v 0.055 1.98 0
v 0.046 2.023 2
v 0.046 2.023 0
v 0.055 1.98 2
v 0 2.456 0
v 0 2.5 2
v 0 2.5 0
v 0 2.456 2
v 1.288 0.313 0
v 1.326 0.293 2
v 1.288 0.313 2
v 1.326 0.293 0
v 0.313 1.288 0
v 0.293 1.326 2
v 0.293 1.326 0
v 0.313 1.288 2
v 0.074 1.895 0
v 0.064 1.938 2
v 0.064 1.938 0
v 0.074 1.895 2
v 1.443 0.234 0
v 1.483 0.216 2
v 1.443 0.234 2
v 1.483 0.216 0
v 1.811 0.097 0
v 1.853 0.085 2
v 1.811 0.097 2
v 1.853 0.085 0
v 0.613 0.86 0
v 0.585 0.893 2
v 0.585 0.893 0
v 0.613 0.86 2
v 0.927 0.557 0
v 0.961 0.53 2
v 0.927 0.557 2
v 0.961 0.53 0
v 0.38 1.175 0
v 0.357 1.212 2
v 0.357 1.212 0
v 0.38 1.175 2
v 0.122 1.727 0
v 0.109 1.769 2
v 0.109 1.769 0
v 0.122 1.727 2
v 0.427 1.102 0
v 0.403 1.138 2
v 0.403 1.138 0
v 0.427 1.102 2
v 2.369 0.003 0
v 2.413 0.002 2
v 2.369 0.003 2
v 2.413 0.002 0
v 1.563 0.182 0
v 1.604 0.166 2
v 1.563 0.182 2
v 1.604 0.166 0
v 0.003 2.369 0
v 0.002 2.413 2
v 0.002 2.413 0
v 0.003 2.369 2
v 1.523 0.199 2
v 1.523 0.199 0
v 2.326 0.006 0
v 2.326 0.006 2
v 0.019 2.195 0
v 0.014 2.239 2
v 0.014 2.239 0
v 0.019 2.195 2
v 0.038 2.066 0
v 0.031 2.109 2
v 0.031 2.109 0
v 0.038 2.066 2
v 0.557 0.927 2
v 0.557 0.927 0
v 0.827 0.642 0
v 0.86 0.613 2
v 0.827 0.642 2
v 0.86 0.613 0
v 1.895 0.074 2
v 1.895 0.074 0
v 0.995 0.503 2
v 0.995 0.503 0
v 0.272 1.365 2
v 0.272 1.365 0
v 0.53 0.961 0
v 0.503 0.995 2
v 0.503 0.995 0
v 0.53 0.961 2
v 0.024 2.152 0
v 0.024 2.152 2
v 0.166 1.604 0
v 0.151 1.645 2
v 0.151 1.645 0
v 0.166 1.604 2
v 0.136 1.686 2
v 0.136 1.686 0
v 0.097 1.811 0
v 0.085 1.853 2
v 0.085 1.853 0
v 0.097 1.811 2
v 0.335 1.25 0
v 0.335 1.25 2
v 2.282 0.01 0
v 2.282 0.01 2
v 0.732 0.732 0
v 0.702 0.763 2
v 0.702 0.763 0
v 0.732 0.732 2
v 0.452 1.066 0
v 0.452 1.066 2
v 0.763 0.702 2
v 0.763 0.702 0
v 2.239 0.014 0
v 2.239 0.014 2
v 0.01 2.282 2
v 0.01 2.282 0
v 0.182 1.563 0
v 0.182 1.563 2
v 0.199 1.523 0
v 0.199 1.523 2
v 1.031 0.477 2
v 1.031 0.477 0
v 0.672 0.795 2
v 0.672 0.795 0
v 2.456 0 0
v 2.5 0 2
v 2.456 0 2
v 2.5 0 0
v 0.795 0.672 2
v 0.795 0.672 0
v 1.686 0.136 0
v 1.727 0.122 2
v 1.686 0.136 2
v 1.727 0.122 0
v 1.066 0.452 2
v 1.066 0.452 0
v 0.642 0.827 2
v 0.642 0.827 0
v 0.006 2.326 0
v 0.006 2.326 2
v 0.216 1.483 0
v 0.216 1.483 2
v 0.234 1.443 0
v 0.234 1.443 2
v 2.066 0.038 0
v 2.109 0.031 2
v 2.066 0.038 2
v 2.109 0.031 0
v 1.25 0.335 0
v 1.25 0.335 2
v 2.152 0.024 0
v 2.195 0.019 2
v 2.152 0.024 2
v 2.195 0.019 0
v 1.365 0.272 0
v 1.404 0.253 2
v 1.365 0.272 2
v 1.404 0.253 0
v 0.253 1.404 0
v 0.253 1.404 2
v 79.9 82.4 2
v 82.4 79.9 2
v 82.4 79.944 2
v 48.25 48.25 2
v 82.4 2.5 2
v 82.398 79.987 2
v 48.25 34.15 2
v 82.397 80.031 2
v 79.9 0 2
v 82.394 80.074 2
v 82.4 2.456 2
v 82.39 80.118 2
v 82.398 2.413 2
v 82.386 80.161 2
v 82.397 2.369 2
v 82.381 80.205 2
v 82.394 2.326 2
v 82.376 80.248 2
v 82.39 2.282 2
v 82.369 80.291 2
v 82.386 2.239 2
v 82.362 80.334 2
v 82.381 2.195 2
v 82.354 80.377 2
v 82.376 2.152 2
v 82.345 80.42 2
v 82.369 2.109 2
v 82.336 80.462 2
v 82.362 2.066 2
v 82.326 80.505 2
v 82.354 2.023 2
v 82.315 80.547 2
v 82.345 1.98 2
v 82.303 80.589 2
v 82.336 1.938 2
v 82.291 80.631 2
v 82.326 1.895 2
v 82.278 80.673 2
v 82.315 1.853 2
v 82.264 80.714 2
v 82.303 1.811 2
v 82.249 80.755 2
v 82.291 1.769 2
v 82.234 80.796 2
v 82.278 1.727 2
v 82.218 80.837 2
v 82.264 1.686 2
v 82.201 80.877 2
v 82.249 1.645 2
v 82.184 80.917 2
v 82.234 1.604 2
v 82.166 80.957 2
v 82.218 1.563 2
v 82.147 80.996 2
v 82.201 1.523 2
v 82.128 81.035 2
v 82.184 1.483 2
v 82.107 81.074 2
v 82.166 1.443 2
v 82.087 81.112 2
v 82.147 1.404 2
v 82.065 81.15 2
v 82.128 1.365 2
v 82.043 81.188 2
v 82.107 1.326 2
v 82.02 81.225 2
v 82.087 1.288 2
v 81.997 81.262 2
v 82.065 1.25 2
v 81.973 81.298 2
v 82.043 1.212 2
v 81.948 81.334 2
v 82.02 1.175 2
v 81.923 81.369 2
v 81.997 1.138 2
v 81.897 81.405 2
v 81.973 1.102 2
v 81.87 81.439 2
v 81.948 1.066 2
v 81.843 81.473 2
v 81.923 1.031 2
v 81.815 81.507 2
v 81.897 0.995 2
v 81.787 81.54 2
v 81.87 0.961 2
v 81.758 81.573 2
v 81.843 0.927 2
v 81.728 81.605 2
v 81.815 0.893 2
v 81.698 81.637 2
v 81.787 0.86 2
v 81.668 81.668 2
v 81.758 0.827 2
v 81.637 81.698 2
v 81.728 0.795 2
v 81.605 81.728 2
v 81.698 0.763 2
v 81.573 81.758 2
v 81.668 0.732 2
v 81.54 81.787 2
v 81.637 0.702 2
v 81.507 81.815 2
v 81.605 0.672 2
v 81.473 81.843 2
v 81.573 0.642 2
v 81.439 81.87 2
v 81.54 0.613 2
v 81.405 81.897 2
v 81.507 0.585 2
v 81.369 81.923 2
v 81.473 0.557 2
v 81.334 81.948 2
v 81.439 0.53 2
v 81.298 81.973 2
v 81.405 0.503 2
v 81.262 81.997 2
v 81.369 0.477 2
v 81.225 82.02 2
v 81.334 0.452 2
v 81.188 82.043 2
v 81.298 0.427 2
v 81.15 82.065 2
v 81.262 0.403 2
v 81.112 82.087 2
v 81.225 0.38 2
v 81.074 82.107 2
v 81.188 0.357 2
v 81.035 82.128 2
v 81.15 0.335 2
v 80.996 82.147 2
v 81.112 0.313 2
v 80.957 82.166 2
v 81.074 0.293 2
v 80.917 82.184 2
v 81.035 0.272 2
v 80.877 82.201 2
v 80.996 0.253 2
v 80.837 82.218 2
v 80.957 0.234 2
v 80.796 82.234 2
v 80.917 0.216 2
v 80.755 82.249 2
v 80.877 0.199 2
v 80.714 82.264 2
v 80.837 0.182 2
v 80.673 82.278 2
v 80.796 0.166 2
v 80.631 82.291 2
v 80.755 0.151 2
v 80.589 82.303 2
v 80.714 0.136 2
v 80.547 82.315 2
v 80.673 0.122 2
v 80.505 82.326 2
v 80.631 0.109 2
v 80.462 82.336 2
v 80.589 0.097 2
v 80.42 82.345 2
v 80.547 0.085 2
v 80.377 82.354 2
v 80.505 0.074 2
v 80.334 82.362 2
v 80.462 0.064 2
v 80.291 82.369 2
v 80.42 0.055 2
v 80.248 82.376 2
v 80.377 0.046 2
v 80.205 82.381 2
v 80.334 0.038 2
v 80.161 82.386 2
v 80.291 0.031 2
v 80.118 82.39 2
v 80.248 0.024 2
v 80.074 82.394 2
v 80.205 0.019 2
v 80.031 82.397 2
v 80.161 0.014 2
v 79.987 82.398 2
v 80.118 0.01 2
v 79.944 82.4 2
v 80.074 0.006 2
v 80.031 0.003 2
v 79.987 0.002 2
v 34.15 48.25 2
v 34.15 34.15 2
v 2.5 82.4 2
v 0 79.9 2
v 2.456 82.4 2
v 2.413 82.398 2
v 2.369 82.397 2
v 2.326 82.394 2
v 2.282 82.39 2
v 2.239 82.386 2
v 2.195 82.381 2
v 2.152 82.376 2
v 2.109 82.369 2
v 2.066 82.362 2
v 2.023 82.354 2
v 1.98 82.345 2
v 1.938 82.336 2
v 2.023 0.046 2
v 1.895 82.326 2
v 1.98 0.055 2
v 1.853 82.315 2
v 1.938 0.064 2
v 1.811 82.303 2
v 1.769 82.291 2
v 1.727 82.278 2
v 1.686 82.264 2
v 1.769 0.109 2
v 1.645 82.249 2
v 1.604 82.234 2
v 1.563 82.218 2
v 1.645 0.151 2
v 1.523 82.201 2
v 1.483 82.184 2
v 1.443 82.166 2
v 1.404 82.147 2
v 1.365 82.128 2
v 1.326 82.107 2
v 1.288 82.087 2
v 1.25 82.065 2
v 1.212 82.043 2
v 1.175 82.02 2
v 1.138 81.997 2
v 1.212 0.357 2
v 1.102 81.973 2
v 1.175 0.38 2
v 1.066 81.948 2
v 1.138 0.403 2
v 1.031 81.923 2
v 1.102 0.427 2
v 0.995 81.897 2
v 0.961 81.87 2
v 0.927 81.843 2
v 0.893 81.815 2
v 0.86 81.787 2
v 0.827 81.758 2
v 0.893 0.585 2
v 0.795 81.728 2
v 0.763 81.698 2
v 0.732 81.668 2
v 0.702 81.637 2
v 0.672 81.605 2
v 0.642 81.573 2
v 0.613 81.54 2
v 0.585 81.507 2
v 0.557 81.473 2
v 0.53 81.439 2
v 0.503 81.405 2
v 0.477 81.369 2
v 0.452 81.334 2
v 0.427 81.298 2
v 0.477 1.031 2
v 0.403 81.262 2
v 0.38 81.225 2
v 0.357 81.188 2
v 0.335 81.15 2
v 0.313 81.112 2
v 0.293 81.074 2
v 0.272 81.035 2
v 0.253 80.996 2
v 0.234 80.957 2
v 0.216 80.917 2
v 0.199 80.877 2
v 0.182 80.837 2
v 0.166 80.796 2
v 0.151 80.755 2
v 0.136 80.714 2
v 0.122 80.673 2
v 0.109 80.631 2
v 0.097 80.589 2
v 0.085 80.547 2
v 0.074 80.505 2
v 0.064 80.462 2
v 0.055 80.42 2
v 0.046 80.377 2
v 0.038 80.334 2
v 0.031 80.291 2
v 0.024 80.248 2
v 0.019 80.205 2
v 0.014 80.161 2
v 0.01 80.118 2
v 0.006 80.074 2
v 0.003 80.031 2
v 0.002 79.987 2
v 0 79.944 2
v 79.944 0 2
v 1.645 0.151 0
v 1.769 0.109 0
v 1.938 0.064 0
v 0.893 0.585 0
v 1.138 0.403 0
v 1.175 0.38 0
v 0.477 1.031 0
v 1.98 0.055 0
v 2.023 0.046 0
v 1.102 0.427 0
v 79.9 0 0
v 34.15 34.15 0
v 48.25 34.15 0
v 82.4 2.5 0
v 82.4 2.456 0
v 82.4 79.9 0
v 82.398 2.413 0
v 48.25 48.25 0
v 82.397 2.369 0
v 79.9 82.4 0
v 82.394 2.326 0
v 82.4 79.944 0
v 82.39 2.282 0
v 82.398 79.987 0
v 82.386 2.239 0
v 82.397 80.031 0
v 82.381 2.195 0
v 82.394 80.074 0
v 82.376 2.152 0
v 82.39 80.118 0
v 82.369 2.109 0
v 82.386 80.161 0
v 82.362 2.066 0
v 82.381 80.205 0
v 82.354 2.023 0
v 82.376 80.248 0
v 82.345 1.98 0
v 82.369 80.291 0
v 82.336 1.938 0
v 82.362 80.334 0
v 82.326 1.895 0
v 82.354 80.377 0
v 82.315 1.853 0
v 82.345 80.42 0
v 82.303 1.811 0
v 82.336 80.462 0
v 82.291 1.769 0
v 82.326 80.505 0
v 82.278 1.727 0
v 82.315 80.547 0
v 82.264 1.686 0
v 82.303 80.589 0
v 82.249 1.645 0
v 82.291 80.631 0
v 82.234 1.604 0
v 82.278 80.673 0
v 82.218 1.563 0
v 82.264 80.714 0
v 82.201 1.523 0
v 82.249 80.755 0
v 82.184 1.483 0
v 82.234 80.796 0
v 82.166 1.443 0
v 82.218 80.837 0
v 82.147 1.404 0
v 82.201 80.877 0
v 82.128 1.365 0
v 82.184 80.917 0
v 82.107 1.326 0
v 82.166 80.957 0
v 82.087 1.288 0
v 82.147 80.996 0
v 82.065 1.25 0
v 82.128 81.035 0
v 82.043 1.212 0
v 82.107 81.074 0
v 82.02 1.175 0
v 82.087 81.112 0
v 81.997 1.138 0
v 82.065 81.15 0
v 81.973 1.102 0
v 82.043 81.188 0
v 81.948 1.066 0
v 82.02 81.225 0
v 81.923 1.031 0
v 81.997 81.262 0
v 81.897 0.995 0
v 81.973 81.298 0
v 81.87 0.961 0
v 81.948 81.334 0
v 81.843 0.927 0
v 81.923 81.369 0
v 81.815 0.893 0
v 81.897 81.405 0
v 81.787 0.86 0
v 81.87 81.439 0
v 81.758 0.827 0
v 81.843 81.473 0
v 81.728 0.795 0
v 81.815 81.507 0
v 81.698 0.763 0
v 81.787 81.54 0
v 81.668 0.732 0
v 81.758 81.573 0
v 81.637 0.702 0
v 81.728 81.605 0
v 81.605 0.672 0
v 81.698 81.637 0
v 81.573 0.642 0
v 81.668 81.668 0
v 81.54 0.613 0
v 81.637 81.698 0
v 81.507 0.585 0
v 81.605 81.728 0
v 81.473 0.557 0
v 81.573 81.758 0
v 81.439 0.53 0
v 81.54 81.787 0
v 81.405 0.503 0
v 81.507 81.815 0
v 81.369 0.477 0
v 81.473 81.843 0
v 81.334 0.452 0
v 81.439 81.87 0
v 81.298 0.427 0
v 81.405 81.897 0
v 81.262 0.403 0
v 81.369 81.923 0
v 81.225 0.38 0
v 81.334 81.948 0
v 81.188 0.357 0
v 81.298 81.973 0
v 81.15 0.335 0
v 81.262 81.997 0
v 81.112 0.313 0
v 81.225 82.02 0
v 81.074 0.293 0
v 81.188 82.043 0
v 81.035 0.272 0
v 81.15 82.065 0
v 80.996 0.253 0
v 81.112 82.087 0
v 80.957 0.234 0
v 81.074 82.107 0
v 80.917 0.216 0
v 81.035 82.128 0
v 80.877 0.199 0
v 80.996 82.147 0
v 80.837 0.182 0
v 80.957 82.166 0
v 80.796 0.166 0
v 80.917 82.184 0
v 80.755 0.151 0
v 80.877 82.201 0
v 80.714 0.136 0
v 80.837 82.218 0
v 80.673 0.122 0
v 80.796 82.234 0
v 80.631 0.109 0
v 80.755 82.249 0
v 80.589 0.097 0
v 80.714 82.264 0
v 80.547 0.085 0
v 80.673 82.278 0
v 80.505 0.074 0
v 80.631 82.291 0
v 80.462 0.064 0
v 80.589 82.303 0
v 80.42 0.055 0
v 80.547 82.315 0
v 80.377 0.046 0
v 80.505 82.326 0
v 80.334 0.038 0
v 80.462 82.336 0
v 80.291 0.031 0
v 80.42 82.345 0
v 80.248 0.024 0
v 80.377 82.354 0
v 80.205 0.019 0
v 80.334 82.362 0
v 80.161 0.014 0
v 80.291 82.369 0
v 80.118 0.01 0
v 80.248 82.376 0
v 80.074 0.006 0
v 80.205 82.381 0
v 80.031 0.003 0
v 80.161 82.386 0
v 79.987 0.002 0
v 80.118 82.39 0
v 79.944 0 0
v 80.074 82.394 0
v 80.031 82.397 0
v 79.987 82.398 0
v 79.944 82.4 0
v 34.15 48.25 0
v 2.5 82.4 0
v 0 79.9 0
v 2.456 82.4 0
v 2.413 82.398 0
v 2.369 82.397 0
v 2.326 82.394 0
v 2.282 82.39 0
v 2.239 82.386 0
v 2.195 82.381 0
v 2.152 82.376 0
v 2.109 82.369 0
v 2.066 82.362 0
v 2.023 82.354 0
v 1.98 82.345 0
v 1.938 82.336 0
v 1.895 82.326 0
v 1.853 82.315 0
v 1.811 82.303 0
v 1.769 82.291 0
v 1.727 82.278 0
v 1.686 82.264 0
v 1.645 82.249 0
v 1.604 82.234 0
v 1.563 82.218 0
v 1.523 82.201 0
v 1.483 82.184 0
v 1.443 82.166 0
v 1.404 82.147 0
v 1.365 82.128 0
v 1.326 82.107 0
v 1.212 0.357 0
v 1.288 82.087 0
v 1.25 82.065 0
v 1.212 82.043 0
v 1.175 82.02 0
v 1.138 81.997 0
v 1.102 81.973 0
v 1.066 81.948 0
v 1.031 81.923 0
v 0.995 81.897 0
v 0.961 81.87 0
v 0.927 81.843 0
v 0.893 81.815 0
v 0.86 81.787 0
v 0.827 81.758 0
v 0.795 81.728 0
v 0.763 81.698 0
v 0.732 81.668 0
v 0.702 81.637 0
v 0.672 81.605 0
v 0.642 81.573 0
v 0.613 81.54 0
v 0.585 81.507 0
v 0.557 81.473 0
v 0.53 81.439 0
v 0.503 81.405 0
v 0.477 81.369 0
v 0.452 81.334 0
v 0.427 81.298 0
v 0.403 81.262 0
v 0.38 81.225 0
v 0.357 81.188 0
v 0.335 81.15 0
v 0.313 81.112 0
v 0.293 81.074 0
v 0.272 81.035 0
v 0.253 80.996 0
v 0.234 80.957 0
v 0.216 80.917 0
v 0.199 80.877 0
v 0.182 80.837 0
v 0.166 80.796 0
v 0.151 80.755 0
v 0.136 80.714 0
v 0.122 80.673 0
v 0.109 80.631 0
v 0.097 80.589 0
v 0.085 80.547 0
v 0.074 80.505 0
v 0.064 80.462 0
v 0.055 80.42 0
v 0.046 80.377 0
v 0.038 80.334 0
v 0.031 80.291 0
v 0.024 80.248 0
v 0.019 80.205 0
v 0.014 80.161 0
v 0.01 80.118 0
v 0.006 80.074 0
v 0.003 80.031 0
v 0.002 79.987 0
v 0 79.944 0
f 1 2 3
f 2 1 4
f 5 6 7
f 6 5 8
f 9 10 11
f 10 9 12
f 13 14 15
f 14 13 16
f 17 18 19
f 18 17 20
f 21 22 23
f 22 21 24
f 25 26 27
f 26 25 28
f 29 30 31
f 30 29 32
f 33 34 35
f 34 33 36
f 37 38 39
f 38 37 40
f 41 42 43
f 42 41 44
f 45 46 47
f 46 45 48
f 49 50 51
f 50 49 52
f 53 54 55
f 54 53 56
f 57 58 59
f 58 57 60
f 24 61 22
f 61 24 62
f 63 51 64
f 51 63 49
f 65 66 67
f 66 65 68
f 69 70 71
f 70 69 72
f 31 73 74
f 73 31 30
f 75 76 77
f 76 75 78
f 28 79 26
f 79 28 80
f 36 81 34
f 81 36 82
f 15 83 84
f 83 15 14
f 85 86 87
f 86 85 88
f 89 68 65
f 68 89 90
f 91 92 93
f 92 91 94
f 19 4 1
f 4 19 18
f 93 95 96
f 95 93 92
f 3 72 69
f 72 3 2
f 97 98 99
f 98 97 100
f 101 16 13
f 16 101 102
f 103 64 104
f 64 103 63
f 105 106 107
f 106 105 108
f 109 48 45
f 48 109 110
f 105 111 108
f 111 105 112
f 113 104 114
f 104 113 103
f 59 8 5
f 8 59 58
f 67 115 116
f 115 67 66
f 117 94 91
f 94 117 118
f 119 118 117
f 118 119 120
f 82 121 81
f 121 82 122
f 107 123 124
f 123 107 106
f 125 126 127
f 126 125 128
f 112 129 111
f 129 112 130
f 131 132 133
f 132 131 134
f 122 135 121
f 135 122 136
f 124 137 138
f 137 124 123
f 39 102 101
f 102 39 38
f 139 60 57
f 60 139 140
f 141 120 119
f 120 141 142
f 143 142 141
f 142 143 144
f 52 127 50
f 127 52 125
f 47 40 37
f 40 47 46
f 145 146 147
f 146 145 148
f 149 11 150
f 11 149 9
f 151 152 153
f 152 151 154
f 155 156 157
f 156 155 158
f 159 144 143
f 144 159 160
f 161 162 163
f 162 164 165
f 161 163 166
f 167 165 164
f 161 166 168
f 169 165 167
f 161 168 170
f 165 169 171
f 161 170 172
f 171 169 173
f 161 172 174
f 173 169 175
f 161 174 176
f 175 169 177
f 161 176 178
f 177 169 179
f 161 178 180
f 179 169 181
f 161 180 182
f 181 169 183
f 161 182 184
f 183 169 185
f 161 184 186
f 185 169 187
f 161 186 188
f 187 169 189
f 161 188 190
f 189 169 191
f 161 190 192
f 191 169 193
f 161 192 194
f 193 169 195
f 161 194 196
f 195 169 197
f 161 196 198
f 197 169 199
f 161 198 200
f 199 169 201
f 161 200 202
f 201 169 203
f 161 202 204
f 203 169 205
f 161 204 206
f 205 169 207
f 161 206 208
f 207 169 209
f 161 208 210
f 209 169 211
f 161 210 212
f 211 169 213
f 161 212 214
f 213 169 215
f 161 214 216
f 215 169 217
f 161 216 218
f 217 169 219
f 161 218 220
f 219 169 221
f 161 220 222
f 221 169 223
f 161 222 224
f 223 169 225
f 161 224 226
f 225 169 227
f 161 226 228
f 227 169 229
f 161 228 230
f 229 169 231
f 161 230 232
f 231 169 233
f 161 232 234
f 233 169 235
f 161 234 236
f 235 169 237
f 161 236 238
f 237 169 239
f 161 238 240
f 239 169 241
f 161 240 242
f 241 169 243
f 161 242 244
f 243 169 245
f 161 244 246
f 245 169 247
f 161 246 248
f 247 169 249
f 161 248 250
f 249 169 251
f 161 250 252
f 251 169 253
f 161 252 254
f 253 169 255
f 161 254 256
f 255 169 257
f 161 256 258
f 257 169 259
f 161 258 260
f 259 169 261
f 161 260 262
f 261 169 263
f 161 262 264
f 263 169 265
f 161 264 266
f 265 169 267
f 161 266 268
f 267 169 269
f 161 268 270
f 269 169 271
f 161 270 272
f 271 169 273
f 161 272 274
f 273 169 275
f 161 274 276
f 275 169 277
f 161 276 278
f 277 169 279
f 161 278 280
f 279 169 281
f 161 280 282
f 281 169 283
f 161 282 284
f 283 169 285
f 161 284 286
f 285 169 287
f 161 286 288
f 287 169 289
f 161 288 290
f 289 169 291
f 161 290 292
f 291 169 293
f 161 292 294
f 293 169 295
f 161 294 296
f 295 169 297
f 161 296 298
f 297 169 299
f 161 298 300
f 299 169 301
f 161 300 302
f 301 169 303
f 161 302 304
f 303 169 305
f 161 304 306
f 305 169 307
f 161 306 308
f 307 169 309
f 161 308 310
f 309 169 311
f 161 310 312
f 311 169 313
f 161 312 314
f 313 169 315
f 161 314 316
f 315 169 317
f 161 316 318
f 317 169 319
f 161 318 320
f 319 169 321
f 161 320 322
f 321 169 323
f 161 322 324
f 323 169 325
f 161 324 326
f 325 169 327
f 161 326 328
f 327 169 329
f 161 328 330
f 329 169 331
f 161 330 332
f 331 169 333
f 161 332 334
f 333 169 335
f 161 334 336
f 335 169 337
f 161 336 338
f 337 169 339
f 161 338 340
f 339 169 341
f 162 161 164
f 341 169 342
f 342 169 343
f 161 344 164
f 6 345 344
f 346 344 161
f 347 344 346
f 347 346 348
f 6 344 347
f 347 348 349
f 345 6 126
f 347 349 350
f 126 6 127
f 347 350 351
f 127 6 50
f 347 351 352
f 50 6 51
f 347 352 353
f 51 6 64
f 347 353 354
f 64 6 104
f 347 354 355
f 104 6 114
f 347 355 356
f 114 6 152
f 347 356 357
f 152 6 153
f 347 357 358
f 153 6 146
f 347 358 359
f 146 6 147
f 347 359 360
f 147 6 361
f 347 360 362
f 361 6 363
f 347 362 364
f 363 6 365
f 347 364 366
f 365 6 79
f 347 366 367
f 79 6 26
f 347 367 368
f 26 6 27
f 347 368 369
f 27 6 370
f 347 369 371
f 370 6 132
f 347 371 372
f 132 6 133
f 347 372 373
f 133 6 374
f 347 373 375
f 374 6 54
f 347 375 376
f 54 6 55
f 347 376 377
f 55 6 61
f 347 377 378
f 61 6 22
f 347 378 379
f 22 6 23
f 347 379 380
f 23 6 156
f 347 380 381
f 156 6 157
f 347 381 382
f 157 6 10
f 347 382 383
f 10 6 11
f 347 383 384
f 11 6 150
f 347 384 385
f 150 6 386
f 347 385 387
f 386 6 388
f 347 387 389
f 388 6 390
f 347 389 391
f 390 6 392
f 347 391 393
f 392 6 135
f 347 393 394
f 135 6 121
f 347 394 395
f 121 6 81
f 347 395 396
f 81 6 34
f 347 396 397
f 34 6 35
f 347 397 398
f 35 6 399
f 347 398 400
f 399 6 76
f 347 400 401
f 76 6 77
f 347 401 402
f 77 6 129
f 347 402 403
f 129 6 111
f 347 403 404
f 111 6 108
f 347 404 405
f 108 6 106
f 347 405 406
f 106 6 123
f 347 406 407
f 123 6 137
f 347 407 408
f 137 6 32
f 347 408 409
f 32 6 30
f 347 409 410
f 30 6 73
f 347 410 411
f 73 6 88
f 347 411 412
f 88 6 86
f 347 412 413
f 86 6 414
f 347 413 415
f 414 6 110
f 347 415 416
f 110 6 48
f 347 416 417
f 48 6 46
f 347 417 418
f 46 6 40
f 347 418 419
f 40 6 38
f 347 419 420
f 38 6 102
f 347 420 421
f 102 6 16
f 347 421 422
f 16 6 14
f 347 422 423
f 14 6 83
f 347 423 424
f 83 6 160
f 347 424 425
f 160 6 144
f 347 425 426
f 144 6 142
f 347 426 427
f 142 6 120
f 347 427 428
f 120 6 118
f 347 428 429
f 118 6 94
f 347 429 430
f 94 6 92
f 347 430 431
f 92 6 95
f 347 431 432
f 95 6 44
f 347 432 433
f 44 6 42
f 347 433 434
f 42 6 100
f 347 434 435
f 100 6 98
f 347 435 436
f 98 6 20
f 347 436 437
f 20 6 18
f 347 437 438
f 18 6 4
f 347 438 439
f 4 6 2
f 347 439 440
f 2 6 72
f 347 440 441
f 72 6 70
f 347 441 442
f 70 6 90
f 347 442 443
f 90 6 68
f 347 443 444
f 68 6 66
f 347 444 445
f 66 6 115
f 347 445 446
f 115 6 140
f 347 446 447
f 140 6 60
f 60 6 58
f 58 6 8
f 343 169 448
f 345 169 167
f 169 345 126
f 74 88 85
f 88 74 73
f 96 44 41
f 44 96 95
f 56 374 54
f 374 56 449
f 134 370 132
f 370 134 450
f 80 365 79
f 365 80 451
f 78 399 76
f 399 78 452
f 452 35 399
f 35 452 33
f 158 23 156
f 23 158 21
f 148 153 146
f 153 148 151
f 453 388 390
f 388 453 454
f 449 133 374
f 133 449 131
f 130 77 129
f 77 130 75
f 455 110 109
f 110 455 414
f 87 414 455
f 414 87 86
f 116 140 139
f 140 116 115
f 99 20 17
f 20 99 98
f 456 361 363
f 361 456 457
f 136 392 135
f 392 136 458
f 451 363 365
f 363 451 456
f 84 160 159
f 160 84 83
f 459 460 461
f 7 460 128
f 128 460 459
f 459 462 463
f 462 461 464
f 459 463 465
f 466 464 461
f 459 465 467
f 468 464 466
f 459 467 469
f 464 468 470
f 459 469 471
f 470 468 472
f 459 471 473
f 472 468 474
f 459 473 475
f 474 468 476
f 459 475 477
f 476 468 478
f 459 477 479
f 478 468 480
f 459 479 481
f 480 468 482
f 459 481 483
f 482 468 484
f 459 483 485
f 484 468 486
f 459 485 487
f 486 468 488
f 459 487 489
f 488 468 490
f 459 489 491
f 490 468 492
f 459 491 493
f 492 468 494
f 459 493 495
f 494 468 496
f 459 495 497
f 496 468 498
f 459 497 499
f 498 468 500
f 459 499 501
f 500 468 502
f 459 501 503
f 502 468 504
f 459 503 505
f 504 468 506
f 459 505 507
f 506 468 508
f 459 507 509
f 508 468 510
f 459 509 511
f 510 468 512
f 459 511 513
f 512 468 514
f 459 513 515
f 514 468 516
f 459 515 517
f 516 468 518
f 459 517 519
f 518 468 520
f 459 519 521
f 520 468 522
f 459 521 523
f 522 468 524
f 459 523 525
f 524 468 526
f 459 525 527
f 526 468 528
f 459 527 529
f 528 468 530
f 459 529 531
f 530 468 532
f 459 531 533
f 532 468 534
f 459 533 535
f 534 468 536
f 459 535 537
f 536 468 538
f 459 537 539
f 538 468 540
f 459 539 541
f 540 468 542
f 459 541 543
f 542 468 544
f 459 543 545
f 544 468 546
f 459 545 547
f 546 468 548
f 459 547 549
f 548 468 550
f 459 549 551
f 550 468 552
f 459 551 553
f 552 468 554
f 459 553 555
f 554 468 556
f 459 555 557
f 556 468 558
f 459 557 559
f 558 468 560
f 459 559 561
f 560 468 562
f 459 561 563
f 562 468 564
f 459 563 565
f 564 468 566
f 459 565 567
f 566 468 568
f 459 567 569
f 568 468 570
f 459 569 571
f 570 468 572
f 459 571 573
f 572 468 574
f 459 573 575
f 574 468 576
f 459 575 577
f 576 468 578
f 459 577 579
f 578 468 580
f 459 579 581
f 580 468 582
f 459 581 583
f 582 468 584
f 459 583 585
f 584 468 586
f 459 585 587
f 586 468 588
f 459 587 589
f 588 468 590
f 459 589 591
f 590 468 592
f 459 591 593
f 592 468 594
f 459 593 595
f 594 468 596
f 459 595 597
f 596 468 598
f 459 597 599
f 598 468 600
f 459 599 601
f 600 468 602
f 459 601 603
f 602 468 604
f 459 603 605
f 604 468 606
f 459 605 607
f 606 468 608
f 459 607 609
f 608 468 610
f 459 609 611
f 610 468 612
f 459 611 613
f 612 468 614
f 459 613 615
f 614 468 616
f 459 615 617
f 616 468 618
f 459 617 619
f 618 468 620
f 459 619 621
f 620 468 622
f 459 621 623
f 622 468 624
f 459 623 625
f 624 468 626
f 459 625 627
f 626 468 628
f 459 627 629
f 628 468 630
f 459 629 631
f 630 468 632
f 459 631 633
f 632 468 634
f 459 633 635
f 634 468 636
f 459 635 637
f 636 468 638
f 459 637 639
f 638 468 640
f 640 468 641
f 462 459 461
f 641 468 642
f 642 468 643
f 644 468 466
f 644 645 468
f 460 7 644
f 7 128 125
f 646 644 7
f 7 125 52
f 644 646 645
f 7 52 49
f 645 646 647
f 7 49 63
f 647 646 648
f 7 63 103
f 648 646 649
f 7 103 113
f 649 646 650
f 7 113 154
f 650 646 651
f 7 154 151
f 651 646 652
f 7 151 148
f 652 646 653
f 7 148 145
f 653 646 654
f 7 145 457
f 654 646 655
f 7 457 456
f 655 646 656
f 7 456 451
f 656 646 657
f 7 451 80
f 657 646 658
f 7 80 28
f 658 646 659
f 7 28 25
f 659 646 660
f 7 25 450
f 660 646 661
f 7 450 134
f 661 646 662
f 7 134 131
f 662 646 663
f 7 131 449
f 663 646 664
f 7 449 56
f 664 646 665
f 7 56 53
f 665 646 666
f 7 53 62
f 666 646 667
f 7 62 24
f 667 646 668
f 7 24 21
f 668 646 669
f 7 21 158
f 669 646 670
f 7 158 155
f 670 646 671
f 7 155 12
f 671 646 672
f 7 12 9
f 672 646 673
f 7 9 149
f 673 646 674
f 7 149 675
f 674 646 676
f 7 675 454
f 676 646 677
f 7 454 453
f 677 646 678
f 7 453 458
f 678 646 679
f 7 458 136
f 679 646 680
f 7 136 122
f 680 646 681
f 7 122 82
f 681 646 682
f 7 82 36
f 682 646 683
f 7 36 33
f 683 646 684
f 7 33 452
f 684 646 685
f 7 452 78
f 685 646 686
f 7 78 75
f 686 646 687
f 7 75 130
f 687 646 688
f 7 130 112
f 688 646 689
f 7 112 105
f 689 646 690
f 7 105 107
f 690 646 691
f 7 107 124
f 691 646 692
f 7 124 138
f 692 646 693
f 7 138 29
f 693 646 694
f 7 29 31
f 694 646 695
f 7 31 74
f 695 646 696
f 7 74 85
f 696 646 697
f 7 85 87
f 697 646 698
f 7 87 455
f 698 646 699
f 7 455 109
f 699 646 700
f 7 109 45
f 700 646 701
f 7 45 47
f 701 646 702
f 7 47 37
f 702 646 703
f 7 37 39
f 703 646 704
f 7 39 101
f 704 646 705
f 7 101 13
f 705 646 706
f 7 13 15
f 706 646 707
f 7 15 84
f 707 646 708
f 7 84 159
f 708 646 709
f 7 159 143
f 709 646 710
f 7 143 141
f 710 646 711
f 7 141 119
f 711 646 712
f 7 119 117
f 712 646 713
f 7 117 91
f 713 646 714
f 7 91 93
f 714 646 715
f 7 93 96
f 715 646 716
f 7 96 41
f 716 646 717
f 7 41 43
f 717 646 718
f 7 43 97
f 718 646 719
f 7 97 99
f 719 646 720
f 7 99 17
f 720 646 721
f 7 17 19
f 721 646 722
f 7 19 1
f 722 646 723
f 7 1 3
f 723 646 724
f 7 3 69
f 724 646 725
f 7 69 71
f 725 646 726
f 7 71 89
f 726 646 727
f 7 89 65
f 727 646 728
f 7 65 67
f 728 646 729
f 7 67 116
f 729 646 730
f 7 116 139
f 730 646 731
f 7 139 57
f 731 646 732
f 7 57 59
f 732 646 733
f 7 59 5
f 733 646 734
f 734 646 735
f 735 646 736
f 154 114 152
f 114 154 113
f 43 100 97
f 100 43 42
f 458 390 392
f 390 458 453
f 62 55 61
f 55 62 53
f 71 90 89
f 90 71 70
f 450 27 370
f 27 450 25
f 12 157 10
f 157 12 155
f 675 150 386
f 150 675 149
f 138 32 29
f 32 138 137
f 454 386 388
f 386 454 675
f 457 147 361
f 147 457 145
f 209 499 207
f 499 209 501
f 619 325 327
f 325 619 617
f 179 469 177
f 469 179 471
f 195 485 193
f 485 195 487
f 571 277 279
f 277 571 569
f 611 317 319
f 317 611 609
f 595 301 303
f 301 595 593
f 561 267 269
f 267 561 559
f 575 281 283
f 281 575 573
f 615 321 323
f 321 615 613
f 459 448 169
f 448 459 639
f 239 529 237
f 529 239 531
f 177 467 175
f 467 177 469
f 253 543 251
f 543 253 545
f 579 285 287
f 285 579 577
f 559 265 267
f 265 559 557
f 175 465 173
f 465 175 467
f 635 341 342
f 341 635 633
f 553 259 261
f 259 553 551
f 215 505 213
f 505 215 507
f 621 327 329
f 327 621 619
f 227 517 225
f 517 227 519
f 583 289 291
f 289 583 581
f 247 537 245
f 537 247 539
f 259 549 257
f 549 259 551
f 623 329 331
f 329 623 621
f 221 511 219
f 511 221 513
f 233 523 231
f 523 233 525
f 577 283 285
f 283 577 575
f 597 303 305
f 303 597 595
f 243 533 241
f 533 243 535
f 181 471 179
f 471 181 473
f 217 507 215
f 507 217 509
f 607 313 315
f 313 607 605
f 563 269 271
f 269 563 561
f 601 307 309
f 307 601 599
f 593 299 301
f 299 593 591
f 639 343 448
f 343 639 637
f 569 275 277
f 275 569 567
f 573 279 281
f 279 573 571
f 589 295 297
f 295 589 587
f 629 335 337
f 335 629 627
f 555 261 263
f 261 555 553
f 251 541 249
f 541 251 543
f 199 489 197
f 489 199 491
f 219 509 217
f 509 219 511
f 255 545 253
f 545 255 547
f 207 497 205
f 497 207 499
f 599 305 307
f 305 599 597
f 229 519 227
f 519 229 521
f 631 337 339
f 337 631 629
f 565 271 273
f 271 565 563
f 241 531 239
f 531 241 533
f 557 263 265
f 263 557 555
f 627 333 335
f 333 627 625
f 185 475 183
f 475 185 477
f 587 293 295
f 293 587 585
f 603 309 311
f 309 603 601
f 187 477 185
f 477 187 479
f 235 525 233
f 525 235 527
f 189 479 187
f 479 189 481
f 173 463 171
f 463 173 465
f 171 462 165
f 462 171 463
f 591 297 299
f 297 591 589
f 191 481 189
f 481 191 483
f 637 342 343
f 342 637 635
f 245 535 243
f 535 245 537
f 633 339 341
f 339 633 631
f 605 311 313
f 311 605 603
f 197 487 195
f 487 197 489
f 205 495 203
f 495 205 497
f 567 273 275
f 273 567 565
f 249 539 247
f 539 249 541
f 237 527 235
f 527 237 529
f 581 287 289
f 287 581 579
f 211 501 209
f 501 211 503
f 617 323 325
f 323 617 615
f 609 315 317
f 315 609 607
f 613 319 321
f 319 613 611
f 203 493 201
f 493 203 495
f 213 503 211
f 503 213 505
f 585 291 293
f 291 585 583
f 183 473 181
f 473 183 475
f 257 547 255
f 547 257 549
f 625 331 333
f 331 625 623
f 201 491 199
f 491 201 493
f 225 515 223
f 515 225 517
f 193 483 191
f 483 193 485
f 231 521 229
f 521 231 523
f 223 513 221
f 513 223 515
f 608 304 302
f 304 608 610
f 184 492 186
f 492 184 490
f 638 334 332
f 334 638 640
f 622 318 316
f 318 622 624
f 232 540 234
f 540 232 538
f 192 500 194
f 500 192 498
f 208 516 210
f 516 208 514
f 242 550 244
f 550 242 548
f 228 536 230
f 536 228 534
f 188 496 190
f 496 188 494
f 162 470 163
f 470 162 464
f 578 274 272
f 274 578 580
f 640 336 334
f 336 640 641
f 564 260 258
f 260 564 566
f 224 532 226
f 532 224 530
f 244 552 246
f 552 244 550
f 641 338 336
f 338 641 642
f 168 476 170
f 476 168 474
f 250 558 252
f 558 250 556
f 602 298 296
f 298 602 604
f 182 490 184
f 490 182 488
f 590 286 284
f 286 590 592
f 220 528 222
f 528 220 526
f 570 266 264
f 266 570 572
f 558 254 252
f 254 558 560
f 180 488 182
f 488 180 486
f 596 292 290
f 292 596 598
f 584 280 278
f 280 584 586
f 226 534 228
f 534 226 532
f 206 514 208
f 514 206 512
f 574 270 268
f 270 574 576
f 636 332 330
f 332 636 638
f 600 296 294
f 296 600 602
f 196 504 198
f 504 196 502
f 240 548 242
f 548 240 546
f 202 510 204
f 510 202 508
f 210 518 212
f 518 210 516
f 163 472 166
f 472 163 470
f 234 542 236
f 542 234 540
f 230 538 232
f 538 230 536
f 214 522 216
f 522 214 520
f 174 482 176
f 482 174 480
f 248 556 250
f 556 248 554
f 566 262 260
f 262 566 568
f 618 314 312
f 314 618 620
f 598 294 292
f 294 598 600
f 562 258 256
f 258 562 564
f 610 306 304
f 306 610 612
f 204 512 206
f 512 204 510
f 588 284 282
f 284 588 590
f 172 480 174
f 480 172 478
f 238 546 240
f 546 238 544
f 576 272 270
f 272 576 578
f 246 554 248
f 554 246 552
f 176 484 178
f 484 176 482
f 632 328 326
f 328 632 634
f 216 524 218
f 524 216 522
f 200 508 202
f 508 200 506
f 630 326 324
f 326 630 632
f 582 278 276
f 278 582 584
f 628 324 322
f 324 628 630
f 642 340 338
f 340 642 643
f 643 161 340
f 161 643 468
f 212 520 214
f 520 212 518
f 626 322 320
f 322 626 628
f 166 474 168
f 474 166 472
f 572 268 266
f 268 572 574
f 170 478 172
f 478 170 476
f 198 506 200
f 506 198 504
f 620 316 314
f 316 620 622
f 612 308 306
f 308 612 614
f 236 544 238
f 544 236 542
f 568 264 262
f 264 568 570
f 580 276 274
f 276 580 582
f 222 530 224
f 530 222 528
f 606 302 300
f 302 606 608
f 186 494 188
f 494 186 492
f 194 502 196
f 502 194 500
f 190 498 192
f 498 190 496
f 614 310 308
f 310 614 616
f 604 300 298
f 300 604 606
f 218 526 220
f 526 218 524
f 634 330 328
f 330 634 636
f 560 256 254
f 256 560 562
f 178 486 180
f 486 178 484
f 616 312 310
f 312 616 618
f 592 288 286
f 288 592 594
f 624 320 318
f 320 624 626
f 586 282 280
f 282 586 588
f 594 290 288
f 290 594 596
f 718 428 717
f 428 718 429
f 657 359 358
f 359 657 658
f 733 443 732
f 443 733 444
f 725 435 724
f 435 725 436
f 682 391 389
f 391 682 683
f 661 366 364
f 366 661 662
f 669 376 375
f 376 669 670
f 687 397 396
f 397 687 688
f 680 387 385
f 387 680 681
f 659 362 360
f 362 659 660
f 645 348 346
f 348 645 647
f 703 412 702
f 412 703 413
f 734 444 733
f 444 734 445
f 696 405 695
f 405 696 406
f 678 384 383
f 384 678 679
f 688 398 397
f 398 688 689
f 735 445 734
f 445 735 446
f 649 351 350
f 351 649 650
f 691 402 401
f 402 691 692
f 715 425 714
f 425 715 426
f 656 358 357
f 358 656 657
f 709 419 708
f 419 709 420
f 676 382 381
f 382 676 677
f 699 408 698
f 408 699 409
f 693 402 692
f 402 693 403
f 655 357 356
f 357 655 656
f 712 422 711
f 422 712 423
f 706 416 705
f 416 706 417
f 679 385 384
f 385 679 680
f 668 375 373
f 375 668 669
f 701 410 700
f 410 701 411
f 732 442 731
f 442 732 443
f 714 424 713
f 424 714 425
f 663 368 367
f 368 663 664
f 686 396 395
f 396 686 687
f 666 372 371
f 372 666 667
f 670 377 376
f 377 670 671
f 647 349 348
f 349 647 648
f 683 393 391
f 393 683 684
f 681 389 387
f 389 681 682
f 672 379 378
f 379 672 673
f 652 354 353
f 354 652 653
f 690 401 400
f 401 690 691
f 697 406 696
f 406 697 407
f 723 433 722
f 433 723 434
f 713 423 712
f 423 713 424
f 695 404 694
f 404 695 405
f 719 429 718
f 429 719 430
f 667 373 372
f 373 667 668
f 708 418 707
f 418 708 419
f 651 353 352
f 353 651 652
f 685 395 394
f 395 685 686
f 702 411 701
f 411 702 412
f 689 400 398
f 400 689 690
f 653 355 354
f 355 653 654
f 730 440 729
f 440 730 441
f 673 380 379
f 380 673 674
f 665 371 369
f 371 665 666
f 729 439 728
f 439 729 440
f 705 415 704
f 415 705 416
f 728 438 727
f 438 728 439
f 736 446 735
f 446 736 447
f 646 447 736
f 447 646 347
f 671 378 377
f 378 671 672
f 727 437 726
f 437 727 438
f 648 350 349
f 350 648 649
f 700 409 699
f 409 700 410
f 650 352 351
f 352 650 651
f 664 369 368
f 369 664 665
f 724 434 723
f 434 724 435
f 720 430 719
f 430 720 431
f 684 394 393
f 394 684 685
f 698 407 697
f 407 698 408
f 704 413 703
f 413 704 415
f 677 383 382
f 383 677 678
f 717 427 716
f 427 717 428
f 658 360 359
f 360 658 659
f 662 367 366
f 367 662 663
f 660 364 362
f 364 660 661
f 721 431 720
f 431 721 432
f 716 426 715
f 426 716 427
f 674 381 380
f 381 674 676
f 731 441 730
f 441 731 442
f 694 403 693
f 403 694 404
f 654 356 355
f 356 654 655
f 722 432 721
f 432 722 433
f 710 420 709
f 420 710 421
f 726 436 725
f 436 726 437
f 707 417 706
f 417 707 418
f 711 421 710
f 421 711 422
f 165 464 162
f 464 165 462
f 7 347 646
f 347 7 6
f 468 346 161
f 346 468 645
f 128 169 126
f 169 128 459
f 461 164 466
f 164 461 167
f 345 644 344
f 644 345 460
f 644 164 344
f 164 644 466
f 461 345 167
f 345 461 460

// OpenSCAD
module roundedcube(xx, yy, height, radius, circle_resolution=36) {
    difference(){

        cube([xx,yy,height]);

        difference(){
            translate([-.5,-.5,-.2])
            cube([radius+.5,radius+.5,height+.5]);

            translate([radius,radius,height/2])
            cylinder(height,radius,radius,true, $fn=circle_resolution);
        }
        translate([xx,0,0])
        rotate(90)
        difference(){
            translate([-.5,-.5,-.2])
            cube([radius+.5,radius+.5,height+.5]);

            translate([radius,radius,height/2])
            cylinder(height,radius,radius,true, $fn=circle_resolution);
        }

        translate([xx,yy,0])
        rotate(180)
        difference(){
            translate([-.5,-.5,-.2])
            cube([radius+.5,radius+.5,height+.5]);

            translate([radius,radius,height/2])
            cylinder(height,radius,radius,true, $fn=circle_resolution);
        }

        translate([0,yy,0])
        rotate(270)
        difference(){
            translate([-.5,-.5,-.2])
            cube([radius+.5,radius+.5,height+.5]);

            translate([radius,radius,height/2])
            cylinder(height,radius,radius,true, $fn=circle_resolution);
        }
    }
}


totalZ=2;
resolution=360;

switchWidth=14.1; // I measured the switches at 13.8mm, but that proved a little snug

numRows=4;
numCols=4;
switchPadding=2;
sidePadding=10;
topPadding=10;
botPadding=topPadding;

totalX = (2 * sidePadding) + (numCols * switchWidth) + ((numCols-1) * switchPadding);
totalY = topPadding + botPadding + (numRows * switchWidth) + ((numRows - 1) * switchPadding);


difference() {
    roundedcube(totalX,totalY,totalZ,2.5, circle_resolution=resolution);
    offsetX=(totalX-switchWidth)/2;
    offsetY=(totalY-switchWidth)/2;
    translate([offsetX,offsetY,-1]) cube([switchWidth, switchWidth, totalZ+2]);
}
